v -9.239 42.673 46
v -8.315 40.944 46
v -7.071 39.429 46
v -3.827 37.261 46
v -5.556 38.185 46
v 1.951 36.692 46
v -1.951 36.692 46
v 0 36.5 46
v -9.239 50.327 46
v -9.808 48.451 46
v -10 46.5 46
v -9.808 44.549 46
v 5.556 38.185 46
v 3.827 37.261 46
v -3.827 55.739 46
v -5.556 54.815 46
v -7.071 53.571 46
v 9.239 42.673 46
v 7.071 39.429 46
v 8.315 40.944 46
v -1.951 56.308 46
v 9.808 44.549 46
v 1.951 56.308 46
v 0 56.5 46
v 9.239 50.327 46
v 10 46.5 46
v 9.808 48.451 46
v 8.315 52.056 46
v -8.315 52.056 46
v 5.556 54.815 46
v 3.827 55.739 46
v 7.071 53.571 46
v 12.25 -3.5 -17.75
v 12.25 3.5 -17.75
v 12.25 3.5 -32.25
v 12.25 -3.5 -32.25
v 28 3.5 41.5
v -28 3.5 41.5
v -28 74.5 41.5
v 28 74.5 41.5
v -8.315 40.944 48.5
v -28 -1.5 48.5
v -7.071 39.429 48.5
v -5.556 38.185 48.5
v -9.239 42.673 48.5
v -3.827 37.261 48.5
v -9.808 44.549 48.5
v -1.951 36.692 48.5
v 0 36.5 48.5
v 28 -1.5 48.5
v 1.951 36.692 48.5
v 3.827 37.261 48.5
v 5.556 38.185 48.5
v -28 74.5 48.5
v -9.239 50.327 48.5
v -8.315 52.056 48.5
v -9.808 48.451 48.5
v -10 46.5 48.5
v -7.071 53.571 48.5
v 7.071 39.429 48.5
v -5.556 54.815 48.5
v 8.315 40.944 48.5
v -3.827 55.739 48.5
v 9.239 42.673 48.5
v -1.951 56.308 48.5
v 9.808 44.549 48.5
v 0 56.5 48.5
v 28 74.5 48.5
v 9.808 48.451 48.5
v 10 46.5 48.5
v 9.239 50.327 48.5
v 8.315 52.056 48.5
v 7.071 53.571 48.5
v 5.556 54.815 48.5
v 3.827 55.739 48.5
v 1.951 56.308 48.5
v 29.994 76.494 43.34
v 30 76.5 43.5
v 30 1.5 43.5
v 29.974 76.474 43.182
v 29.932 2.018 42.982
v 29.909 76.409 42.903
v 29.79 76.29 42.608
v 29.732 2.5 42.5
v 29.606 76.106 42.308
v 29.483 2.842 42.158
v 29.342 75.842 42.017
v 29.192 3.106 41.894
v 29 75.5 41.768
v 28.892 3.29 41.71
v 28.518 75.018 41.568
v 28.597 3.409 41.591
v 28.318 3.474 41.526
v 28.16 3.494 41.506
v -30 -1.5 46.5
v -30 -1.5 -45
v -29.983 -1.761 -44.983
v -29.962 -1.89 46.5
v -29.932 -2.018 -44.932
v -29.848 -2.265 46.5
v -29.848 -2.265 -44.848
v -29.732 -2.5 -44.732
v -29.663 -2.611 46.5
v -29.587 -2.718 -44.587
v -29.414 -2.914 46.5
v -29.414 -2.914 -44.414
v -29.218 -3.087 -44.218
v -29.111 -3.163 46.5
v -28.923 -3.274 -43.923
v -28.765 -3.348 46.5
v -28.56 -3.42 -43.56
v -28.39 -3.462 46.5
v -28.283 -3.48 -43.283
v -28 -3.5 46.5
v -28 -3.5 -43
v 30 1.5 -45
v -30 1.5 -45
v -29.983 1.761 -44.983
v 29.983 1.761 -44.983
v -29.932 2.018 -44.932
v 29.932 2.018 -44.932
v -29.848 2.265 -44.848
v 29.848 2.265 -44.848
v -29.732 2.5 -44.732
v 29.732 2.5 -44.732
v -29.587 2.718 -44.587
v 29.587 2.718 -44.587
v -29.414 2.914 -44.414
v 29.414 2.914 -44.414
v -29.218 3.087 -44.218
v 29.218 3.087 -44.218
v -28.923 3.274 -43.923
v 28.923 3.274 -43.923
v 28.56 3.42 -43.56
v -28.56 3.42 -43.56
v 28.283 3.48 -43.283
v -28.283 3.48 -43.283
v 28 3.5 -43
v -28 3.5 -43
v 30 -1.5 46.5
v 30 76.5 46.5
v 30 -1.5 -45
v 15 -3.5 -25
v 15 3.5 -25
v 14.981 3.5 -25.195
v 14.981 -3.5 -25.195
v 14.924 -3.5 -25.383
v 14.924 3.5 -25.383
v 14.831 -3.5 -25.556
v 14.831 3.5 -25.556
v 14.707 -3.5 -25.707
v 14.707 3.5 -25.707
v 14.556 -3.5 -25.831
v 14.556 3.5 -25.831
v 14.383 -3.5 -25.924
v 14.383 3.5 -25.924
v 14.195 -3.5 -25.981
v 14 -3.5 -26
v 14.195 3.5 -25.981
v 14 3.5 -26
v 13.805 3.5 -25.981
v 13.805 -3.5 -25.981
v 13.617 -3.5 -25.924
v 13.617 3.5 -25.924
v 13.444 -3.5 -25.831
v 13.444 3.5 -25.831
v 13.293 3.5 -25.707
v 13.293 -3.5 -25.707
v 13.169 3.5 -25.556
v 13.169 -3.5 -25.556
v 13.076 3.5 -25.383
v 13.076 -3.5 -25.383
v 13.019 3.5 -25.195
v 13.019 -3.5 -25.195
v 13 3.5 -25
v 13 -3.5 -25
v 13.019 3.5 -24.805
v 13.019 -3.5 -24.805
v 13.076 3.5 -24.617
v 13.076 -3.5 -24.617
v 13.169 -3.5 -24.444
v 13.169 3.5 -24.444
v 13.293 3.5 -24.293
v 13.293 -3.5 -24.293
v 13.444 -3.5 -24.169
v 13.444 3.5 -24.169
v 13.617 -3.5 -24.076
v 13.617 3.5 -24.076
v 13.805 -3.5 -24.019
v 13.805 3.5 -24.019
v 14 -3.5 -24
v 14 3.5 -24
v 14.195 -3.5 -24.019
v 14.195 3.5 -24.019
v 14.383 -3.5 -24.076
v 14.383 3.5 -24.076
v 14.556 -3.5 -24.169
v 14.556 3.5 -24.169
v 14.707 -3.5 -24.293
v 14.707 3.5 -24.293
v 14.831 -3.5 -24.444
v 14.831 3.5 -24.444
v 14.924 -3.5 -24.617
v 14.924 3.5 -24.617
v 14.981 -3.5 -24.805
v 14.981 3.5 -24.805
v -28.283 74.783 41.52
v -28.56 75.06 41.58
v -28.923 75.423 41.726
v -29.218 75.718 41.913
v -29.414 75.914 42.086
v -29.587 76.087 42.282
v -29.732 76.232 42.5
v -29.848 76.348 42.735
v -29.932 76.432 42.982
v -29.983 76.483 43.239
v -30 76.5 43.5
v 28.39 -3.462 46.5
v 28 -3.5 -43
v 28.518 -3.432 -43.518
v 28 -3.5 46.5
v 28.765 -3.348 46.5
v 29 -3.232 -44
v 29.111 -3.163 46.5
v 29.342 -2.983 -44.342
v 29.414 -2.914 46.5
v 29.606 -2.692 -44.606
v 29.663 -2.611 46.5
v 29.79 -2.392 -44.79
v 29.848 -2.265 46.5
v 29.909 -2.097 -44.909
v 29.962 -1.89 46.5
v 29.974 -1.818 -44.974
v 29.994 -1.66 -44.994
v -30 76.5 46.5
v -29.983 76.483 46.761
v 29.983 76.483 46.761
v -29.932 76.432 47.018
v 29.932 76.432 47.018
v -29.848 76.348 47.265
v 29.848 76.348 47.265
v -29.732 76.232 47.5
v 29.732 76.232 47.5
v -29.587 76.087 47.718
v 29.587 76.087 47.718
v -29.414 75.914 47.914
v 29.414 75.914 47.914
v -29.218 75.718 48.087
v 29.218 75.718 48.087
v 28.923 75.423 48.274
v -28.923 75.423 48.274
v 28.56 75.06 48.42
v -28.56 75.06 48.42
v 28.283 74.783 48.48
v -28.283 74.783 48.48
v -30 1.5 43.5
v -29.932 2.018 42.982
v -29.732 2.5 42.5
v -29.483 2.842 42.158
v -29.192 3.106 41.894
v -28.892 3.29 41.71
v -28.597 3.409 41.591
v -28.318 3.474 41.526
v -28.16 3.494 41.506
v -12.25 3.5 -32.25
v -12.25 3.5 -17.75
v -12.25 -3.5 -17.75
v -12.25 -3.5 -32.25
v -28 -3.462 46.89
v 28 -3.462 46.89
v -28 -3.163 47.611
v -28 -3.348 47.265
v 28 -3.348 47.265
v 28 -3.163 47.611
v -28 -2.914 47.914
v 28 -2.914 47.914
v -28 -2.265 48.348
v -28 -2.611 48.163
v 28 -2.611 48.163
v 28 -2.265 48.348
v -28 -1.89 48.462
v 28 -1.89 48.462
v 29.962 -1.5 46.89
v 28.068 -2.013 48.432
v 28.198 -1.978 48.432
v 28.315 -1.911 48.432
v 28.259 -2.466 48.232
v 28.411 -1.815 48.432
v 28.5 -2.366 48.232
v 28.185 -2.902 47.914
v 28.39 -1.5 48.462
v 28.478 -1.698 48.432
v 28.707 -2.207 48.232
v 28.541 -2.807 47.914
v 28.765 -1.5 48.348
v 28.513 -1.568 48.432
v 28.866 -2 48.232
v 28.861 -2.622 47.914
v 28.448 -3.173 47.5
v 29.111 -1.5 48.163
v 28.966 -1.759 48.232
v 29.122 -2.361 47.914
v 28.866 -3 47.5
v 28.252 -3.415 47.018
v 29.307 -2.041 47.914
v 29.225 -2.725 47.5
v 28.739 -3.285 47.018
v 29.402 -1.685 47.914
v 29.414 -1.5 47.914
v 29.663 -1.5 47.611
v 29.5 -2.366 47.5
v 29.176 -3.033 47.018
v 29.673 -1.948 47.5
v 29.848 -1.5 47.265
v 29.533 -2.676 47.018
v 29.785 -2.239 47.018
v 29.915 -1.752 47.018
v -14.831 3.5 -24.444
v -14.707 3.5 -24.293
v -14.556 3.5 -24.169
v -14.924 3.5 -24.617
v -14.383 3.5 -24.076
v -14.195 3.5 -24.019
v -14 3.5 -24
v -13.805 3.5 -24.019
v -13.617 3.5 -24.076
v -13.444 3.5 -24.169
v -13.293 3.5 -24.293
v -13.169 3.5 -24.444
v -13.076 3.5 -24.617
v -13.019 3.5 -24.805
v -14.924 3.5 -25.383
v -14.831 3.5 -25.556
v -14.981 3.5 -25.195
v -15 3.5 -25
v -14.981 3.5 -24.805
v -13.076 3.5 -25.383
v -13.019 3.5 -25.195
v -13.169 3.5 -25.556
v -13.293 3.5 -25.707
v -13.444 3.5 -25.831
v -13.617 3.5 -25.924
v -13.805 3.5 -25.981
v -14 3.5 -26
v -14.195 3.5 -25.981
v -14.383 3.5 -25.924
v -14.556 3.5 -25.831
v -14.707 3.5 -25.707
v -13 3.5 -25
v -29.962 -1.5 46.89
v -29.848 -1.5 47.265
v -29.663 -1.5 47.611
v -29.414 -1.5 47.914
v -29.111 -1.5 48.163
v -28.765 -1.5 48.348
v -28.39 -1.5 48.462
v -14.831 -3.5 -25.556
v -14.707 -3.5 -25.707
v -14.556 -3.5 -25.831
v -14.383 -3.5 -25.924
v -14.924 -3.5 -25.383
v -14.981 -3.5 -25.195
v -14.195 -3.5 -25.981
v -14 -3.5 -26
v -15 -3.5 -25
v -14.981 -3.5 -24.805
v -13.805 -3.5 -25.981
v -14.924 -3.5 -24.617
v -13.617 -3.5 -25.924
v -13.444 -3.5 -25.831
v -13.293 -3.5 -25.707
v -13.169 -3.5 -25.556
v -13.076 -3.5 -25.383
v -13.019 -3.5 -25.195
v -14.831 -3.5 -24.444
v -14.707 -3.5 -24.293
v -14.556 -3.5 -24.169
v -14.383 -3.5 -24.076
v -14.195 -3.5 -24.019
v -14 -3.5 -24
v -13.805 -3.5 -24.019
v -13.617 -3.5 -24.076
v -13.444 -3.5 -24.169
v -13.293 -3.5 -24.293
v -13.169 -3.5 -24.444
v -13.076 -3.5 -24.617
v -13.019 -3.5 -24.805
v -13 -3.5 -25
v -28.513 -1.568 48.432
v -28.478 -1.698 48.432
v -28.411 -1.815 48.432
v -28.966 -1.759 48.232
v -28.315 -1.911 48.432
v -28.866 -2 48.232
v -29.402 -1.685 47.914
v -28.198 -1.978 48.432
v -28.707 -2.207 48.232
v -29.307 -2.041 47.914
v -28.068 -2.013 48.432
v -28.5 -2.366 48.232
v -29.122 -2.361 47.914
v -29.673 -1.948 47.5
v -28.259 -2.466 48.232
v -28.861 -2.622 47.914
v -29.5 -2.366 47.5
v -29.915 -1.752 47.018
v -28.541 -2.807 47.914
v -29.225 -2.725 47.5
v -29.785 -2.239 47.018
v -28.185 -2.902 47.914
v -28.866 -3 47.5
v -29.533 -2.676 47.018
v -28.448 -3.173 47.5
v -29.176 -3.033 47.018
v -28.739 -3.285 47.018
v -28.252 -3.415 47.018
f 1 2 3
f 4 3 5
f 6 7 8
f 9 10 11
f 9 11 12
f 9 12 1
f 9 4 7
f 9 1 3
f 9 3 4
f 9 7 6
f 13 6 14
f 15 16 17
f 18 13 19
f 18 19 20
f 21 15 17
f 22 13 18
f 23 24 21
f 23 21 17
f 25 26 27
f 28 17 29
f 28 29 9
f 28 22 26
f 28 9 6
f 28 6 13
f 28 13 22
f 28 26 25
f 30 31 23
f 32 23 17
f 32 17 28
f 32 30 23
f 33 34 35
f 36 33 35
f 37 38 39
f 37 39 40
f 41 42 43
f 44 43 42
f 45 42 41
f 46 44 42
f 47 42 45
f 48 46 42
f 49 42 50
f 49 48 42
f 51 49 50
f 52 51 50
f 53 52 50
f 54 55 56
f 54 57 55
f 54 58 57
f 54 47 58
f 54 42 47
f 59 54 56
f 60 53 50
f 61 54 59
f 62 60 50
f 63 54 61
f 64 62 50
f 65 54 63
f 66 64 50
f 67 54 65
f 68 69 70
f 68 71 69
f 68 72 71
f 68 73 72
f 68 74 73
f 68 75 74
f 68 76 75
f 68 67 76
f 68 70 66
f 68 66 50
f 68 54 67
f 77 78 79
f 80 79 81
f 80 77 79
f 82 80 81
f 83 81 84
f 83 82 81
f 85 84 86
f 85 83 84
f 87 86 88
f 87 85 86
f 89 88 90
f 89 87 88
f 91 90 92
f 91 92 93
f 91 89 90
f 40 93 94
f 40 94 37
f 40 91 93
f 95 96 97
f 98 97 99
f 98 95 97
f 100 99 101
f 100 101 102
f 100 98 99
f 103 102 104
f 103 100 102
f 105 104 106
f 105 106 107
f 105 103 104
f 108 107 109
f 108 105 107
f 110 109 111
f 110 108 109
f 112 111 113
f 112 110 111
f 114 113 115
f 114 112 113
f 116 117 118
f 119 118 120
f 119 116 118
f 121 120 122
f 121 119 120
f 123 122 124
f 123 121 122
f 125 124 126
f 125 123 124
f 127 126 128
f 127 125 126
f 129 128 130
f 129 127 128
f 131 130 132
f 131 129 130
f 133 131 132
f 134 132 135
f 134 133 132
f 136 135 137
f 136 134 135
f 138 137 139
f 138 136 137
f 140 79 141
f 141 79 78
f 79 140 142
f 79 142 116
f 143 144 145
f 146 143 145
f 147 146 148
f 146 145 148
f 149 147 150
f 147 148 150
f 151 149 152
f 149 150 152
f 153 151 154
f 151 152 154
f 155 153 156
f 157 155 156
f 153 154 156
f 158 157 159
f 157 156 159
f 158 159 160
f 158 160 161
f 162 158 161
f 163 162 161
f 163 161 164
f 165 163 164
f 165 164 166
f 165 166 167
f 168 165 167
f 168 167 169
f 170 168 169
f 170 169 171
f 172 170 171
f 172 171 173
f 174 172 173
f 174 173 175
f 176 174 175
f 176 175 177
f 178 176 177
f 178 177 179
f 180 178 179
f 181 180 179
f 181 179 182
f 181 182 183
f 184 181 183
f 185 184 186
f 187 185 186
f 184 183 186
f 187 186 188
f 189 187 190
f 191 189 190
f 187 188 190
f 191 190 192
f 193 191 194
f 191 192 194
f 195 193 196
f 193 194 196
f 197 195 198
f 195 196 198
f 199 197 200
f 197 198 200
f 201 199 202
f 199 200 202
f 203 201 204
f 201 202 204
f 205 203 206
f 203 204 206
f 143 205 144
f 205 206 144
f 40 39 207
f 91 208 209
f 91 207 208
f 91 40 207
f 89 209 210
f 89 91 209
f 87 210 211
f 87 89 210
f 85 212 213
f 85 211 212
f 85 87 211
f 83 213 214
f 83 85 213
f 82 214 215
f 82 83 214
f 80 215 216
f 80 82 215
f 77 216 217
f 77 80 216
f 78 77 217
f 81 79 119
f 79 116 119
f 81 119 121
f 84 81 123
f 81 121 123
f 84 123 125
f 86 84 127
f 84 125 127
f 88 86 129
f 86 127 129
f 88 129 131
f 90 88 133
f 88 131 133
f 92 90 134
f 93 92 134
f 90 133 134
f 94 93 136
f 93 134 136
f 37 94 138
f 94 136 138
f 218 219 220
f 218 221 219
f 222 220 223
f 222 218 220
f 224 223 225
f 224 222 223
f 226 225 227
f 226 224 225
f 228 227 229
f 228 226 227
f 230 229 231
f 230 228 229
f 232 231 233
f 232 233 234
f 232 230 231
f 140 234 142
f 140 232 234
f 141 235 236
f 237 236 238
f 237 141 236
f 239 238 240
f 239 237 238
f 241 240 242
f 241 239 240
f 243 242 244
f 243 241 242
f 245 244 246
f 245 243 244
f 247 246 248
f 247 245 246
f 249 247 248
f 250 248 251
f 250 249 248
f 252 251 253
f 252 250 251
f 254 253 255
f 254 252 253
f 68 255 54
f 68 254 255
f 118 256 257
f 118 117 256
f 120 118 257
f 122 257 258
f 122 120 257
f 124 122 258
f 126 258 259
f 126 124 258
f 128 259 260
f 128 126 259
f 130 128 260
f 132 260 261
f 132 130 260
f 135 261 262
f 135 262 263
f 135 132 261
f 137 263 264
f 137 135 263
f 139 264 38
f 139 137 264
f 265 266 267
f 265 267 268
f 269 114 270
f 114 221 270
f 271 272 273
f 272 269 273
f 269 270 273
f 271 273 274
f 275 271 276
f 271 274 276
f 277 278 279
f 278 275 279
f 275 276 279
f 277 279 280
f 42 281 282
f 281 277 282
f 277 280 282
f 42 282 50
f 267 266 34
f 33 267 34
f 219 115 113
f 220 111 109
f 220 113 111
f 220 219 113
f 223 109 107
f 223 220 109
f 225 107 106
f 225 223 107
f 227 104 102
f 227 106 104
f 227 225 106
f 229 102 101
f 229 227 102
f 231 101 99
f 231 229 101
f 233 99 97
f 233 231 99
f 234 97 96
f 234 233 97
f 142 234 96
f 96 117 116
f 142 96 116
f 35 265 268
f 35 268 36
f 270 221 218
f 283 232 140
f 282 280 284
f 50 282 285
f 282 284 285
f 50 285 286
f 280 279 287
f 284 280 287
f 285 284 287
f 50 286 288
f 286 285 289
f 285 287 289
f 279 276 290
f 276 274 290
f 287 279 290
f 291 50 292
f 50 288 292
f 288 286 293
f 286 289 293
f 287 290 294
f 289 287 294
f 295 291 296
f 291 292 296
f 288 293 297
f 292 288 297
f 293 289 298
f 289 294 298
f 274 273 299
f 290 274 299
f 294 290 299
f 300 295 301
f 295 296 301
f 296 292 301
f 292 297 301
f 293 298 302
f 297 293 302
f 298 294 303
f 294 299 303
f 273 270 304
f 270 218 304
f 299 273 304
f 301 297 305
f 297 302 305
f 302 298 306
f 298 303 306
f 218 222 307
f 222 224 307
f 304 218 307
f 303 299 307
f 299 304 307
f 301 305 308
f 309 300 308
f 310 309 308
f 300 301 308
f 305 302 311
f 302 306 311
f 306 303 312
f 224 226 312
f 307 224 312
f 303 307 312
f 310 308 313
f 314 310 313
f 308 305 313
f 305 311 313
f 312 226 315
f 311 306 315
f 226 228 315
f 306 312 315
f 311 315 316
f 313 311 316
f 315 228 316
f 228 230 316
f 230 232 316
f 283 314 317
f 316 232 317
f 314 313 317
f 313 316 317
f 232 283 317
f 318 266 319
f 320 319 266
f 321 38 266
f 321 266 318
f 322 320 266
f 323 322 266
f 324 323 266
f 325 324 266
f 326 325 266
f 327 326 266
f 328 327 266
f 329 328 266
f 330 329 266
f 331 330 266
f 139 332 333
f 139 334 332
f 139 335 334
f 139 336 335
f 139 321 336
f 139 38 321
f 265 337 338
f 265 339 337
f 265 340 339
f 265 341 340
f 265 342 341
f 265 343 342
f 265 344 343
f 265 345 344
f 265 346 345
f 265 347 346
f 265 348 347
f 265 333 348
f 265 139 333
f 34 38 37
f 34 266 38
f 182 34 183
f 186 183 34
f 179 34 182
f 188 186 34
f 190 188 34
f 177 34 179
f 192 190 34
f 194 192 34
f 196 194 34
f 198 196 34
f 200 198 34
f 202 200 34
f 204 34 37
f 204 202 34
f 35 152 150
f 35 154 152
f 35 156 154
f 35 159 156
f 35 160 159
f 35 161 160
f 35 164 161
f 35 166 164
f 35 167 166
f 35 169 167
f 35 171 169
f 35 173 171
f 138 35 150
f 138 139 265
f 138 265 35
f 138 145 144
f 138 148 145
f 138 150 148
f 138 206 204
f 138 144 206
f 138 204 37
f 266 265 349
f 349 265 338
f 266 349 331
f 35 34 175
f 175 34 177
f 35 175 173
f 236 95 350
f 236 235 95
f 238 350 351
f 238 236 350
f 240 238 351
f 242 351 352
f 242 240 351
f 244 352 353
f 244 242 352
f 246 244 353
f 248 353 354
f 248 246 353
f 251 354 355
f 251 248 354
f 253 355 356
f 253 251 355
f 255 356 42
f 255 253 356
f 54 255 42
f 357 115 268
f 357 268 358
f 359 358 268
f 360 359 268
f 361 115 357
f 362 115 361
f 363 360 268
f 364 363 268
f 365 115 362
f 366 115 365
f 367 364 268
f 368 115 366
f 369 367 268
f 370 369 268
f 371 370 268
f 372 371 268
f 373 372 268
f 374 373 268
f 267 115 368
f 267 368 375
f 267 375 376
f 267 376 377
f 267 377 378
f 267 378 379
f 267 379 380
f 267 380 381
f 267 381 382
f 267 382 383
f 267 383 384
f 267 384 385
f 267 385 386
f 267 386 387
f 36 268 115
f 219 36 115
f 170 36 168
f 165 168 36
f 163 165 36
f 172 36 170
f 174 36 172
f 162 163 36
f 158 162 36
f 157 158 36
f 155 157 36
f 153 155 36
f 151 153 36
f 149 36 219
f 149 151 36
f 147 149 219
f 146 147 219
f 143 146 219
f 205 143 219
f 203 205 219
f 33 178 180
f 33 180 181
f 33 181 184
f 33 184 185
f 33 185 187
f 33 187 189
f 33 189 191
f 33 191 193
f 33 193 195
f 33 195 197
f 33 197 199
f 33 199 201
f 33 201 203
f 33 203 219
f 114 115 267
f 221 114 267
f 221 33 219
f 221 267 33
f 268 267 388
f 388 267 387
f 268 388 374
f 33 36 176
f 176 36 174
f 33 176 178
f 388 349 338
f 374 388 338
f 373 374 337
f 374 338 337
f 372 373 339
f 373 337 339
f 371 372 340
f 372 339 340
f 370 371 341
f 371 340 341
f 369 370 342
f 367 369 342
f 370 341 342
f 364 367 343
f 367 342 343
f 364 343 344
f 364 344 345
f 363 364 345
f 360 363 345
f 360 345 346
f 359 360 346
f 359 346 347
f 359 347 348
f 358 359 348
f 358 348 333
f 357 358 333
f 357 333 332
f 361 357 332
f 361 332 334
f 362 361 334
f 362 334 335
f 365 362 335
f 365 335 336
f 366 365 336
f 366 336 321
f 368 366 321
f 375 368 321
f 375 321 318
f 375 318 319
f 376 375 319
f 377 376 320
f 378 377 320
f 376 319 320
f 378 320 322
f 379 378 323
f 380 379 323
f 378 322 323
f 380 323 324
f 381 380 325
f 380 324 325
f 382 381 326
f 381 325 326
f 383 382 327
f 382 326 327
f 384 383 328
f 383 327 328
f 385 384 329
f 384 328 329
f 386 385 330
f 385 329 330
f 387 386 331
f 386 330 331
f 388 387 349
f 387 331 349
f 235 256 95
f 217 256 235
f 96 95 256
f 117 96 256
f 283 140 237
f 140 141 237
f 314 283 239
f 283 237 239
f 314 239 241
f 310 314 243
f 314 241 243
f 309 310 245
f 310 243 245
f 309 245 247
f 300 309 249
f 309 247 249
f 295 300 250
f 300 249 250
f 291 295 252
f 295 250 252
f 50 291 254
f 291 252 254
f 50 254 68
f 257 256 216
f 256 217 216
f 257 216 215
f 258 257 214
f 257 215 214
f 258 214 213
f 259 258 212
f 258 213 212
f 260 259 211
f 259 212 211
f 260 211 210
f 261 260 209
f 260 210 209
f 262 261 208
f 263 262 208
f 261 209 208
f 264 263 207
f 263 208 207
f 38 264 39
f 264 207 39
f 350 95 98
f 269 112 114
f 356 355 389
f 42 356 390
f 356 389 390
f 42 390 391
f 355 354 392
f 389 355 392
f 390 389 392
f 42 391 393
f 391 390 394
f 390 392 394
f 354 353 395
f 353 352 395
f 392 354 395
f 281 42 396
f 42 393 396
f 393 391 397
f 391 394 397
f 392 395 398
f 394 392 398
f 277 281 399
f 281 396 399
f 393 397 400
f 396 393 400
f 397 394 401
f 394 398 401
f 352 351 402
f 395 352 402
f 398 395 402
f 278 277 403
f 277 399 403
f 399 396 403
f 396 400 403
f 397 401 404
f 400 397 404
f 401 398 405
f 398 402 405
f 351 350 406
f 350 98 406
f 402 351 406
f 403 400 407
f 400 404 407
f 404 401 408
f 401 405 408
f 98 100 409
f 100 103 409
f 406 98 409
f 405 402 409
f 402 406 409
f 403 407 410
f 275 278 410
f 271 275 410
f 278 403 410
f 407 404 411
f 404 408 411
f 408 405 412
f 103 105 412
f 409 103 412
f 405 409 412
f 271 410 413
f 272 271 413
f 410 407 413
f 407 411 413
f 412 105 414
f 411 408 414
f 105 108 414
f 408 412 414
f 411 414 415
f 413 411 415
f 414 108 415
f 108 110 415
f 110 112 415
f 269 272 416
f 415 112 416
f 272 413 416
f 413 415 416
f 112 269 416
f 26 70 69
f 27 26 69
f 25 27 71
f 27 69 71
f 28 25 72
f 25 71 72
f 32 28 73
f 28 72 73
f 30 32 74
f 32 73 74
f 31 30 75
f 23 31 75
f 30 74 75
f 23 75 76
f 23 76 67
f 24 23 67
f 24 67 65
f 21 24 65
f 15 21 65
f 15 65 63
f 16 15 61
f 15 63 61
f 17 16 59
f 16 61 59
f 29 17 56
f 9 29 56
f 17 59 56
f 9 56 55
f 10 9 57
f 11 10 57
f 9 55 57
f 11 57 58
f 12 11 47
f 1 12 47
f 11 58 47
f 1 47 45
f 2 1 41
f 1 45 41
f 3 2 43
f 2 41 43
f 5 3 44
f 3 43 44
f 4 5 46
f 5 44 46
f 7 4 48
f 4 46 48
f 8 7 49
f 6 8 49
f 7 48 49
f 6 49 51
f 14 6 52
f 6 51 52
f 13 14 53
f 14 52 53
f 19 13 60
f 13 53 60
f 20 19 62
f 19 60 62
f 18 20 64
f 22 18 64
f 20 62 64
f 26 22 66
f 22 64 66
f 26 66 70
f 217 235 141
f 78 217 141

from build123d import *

# Parameters (mm, degrees)
BASE_DEPTH              = 3.5
BASE_DEPTH_BACK         = 3.5
CROQUIS1_W              = 60
CROQUIS1_H              = 90
AGUJERO_SERVO_REACH     = 56.534
CROQUIS2_R              = 1
CROQUIS2_W              = 24.5
CROQUIS2_H              = 14.5
PARED_DEPTH             = 3.5
PARED_DEPTH_BACK        = 3.5
CROQUIS3_W              = 60
CROQUIS3_H              = 80
REDONDEO2_R             = 2
CROQUIS4_R              = 10
RECORTENUEVOSERVO_DEPTH = 2.5


with BuildPart() as part:
    # Croquis1 → Base (new, two sides: drawn at the far end of the back side and taken through both)
    with BuildSketch(Plane(origin=(0, 0, 0), x_dir=(1, 0, 0), z_dir=(0, 1, 0)).offset(-BASE_DEPTH_BACK)):
        Rectangle(CROQUIS1_W, CROQUIS1_H)
    extrude(amount=BASE_DEPTH + BASE_DEPTH_BACK)

    # Croquis2 → Agujero Servo (cut, up to next)
    with BuildSketch(Plane(origin=(0, 3.5, 0), x_dir=(1, 0, 0), z_dir=(0, 1, 0)), mode=Mode.PRIVATE) as agujero_servo_sk1:
        with Locations((-14, 25)):
            Circle(CROQUIS2_R)
    agujero_servo_tool1 = extrude(agujero_servo_sk1.sketch, amount=-AGUJERO_SERVO_REACH, mode=Mode.PRIVATE) & part.part
    # Croquis2 → Agujero Servo (cut, up to next)
    with BuildSketch(Plane(origin=(0, 3.5, 0), x_dir=(1, 0, 0), z_dir=(0, 1, 0)), mode=Mode.PRIVATE) as agujero_servo_sk2:
        with Locations((14, 25)):
            Circle(CROQUIS2_R)
    agujero_servo_tool2 = extrude(agujero_servo_sk2.sketch, amount=-AGUJERO_SERVO_REACH, mode=Mode.PRIVATE) & part.part
    # Croquis2 → Agujero Servo (cut, up to next)
    with BuildSketch(Plane(origin=(0, 3.5, 0), x_dir=(1, 0, 0), z_dir=(0, 1, 0)), mode=Mode.PRIVATE) as agujero_servo_sk3:
        with Locations((0, 25)):
            Rectangle(CROQUIS2_W, CROQUIS2_H)
    agujero_servo_tool3 = extrude(agujero_servo_sk3.sketch, amount=-AGUJERO_SERVO_REACH, mode=Mode.PRIVATE) & part.part
    add(agujero_servo_tool1.solids().sort_by_distance((-14, 3.5, -25))[0], mode=Mode.SUBTRACT)
    add(agujero_servo_tool2.solids().sort_by_distance((14, 3.5, -25))[0], mode=Mode.SUBTRACT)
    add(agujero_servo_tool3.solids().sort_by_distance((0, 3.5, -25))[0], mode=Mode.SUBTRACT)

    # Croquis3 → Pared (add, two sides: drawn at the far end of the back side and taken through both)
    with BuildSketch(Plane.XY.offset(45).offset(-PARED_DEPTH_BACK)):
        with Locations((0, 36.5)):
            Rectangle(CROQUIS3_W, CROQUIS3_H)
    extrude(amount=PARED_DEPTH + PARED_DEPTH_BACK)

    # Redondeo2
    redondeo2_edges = [part.edges().sort_by_distance(p)[0] for p in [
        (0, 76.5, 48.5),
        (30, 36.5, 48.5),
        (0, -3.5, 48.5),
        (-30, 36.5, 48.5),
        (-30, 40, 41.5),
        (30, 40, 41.5),
        (0, 76.5, 41.5),
        (30, -3.5, 1.75),
        (30, 3.5, -1.75),
        (0, -3.5, -45),
        (0, 3.5, -45),
        (-30, -3.5, 1.75),
        (-30, 3.5, -1.75),
    ]]
    fillet(redondeo2_edges, radius=REDONDEO2_R)

    # Croquis4 → RecorteNuevoServo (cut)
    with BuildSketch(Plane.XY.offset(48.5)):
        with Locations((0, 46.5)):
            Circle(CROQUIS4_R)
    extrude(amount=-RECORTENUEVOSERVO_DEPTH, mode=Mode.SUBTRACT)


solid = part.part
